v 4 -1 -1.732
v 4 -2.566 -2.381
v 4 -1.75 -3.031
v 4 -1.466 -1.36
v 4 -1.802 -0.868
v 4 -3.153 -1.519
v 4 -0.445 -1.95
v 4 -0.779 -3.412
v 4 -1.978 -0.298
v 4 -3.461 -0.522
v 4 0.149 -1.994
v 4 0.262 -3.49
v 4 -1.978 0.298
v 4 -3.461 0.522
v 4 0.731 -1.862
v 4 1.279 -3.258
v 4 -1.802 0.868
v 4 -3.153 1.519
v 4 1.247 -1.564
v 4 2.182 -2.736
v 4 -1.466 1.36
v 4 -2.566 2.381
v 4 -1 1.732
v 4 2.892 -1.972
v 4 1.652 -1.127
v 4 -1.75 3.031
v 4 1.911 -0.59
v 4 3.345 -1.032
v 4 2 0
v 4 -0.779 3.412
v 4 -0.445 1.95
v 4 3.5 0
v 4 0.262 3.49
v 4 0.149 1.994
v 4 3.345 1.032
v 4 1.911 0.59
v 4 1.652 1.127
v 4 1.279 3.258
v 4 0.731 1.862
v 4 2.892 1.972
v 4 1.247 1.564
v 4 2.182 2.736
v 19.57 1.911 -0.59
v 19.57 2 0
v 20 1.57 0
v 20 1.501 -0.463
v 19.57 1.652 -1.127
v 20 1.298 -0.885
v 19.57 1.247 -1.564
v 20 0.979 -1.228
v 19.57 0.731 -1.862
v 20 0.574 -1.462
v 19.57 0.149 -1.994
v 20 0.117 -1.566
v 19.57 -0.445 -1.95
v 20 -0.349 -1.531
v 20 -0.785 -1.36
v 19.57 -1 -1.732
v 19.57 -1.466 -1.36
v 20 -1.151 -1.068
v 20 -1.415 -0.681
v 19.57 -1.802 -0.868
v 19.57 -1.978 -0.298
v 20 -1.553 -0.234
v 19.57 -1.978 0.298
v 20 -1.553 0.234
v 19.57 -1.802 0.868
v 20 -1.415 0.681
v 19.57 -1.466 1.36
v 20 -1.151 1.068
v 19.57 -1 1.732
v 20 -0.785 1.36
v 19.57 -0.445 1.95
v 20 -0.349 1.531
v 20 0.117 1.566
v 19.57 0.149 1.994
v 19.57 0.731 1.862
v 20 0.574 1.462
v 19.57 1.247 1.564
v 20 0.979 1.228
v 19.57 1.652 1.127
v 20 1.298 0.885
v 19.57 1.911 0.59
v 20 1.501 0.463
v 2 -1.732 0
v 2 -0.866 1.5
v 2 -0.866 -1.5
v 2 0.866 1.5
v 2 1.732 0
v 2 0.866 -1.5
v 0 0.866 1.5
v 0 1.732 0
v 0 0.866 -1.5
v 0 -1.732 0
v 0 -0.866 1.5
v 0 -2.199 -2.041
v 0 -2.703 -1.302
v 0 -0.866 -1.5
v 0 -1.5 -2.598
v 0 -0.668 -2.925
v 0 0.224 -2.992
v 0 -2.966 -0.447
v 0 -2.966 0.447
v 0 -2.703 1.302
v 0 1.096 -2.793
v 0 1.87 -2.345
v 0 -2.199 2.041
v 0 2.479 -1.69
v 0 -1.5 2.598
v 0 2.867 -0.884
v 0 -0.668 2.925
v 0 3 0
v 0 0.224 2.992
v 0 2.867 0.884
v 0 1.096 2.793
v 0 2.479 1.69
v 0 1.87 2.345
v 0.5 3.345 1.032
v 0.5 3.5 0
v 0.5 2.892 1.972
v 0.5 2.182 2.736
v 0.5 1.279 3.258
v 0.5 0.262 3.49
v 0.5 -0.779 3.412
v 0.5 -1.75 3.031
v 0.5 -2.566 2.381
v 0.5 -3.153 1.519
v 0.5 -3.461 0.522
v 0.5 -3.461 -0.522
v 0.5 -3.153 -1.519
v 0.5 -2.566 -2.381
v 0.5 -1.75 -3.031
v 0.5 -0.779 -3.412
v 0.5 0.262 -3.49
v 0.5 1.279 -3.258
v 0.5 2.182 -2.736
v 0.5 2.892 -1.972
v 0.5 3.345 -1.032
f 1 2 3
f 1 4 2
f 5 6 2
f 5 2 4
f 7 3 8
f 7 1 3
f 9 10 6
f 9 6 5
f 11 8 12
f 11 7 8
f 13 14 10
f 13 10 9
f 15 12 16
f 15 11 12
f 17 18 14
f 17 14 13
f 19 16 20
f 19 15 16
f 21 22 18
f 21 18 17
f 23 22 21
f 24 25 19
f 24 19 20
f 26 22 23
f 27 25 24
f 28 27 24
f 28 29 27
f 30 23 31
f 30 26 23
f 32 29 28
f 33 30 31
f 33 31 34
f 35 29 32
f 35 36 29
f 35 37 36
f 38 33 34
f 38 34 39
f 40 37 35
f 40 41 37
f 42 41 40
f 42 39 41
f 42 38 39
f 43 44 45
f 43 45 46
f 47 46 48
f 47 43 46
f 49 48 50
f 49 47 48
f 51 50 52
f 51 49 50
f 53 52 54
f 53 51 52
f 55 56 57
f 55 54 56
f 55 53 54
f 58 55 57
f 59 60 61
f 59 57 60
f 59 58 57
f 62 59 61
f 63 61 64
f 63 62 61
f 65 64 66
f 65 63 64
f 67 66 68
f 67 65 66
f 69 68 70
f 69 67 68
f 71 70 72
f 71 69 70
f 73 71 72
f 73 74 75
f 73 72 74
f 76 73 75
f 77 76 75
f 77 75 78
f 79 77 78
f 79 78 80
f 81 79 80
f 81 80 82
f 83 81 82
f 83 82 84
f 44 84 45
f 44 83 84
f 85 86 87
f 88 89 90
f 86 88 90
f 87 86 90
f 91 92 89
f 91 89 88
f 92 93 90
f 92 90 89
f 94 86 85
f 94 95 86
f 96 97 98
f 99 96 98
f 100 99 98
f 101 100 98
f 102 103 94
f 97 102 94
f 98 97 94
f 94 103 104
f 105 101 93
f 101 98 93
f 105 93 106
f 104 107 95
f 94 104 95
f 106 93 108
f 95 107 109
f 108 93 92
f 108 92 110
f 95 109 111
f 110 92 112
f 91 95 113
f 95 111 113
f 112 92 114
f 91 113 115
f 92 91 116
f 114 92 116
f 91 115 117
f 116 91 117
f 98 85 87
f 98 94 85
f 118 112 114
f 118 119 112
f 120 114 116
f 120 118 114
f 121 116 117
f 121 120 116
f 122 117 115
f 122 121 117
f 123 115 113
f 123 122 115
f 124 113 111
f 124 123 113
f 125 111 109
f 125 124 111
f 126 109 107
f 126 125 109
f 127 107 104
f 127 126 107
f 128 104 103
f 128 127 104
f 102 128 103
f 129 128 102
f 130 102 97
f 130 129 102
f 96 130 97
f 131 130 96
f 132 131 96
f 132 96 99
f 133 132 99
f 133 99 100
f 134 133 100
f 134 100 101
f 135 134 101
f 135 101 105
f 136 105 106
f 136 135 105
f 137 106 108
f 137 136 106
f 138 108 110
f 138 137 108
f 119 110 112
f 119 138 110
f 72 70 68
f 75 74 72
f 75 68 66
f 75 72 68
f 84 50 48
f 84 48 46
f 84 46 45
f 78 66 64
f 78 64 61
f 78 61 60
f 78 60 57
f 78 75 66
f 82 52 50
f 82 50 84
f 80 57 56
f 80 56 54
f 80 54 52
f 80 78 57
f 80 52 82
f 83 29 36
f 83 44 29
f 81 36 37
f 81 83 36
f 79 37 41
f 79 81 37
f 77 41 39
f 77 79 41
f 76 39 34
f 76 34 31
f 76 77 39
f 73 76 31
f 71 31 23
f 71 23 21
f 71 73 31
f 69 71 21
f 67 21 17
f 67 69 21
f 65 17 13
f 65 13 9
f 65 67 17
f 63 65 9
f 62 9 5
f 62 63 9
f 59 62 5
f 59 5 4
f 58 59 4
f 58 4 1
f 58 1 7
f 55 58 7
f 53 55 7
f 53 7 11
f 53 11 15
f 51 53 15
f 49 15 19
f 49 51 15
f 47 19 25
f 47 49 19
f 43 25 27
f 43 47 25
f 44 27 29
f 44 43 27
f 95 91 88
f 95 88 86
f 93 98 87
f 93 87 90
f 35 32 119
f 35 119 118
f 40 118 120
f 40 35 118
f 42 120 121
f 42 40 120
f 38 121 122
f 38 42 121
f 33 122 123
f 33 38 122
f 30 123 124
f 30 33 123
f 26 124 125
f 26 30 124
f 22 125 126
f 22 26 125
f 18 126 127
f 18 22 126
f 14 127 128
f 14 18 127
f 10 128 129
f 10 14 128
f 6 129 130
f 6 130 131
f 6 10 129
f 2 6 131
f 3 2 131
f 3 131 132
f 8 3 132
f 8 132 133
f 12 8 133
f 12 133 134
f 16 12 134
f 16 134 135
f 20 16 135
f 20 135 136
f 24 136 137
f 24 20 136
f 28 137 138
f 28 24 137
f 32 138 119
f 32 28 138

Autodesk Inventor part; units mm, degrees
sketch "__1" plane through (0, 0, 0) normal (0, 0, 1) x (1, 0, 0)
  line L0 (66, 0) -> (-66, 0)
  line L1 (0, 0) -> (0, 3.5)
  line L2 (0, 3.5) -> (4, 3.5)
  line L3 (4, 3.5) -> (4, 2)
  line L4 (4, 2) -> (19.5705, 2)
  line L5 (19.5705, 2) -> (20, 1.5705)
  line L6 (20, 1.5705) -> (20, 0)
  line L7 (20, 0) -> (0, 0)
revolve "Revolution1" add sketch "__1" angle 360 about axis through (66, 0, 0) along (1, 0, 0)
thread "Thread1" size "M4x0.7" class "6g" standard "ISO Metric profile" full length
sketch "__2" plane through (0, 0, 0) normal (1, 0, 0) x (0, 0, -1)
  line L0 (-1.5, -0.866) -> (0, -1.7321)
  line L1 (0, -1.7321) -> (1.5, -0.866)
  line L2 (1.5, -0.866) -> (1.5, 0.866)
  line L3 (1.5, 0.866) -> (0, 1.7321)
  line L4 (0, 1.7321) -> (-1.5, 0.866)
  line L5 (-1.5, 0.866) -> (-1.5, -0.866)
extrude "Extrusion1" cut sketch "__2" along normal blind 2
chamfer "Chamfer1" distance 0.5 angle 45 1 edges at (0, -3.5, 0)
ref_plane "PPBF_KEDS_XY" through (4, 0, 0) normal (-1, 0, 0) x (0, 0, -1)
ref_plane "PPBF_KEDS_YZ" through (4, 0, 0) normal (0, 0, -1) x (0, -1, 0)
ref_plane "PPBF_KEDS_ZX" through (4, 0, 0) normal (0, -1, 0) x (-1, 0, 0)
properties part number "CBB4-16"
